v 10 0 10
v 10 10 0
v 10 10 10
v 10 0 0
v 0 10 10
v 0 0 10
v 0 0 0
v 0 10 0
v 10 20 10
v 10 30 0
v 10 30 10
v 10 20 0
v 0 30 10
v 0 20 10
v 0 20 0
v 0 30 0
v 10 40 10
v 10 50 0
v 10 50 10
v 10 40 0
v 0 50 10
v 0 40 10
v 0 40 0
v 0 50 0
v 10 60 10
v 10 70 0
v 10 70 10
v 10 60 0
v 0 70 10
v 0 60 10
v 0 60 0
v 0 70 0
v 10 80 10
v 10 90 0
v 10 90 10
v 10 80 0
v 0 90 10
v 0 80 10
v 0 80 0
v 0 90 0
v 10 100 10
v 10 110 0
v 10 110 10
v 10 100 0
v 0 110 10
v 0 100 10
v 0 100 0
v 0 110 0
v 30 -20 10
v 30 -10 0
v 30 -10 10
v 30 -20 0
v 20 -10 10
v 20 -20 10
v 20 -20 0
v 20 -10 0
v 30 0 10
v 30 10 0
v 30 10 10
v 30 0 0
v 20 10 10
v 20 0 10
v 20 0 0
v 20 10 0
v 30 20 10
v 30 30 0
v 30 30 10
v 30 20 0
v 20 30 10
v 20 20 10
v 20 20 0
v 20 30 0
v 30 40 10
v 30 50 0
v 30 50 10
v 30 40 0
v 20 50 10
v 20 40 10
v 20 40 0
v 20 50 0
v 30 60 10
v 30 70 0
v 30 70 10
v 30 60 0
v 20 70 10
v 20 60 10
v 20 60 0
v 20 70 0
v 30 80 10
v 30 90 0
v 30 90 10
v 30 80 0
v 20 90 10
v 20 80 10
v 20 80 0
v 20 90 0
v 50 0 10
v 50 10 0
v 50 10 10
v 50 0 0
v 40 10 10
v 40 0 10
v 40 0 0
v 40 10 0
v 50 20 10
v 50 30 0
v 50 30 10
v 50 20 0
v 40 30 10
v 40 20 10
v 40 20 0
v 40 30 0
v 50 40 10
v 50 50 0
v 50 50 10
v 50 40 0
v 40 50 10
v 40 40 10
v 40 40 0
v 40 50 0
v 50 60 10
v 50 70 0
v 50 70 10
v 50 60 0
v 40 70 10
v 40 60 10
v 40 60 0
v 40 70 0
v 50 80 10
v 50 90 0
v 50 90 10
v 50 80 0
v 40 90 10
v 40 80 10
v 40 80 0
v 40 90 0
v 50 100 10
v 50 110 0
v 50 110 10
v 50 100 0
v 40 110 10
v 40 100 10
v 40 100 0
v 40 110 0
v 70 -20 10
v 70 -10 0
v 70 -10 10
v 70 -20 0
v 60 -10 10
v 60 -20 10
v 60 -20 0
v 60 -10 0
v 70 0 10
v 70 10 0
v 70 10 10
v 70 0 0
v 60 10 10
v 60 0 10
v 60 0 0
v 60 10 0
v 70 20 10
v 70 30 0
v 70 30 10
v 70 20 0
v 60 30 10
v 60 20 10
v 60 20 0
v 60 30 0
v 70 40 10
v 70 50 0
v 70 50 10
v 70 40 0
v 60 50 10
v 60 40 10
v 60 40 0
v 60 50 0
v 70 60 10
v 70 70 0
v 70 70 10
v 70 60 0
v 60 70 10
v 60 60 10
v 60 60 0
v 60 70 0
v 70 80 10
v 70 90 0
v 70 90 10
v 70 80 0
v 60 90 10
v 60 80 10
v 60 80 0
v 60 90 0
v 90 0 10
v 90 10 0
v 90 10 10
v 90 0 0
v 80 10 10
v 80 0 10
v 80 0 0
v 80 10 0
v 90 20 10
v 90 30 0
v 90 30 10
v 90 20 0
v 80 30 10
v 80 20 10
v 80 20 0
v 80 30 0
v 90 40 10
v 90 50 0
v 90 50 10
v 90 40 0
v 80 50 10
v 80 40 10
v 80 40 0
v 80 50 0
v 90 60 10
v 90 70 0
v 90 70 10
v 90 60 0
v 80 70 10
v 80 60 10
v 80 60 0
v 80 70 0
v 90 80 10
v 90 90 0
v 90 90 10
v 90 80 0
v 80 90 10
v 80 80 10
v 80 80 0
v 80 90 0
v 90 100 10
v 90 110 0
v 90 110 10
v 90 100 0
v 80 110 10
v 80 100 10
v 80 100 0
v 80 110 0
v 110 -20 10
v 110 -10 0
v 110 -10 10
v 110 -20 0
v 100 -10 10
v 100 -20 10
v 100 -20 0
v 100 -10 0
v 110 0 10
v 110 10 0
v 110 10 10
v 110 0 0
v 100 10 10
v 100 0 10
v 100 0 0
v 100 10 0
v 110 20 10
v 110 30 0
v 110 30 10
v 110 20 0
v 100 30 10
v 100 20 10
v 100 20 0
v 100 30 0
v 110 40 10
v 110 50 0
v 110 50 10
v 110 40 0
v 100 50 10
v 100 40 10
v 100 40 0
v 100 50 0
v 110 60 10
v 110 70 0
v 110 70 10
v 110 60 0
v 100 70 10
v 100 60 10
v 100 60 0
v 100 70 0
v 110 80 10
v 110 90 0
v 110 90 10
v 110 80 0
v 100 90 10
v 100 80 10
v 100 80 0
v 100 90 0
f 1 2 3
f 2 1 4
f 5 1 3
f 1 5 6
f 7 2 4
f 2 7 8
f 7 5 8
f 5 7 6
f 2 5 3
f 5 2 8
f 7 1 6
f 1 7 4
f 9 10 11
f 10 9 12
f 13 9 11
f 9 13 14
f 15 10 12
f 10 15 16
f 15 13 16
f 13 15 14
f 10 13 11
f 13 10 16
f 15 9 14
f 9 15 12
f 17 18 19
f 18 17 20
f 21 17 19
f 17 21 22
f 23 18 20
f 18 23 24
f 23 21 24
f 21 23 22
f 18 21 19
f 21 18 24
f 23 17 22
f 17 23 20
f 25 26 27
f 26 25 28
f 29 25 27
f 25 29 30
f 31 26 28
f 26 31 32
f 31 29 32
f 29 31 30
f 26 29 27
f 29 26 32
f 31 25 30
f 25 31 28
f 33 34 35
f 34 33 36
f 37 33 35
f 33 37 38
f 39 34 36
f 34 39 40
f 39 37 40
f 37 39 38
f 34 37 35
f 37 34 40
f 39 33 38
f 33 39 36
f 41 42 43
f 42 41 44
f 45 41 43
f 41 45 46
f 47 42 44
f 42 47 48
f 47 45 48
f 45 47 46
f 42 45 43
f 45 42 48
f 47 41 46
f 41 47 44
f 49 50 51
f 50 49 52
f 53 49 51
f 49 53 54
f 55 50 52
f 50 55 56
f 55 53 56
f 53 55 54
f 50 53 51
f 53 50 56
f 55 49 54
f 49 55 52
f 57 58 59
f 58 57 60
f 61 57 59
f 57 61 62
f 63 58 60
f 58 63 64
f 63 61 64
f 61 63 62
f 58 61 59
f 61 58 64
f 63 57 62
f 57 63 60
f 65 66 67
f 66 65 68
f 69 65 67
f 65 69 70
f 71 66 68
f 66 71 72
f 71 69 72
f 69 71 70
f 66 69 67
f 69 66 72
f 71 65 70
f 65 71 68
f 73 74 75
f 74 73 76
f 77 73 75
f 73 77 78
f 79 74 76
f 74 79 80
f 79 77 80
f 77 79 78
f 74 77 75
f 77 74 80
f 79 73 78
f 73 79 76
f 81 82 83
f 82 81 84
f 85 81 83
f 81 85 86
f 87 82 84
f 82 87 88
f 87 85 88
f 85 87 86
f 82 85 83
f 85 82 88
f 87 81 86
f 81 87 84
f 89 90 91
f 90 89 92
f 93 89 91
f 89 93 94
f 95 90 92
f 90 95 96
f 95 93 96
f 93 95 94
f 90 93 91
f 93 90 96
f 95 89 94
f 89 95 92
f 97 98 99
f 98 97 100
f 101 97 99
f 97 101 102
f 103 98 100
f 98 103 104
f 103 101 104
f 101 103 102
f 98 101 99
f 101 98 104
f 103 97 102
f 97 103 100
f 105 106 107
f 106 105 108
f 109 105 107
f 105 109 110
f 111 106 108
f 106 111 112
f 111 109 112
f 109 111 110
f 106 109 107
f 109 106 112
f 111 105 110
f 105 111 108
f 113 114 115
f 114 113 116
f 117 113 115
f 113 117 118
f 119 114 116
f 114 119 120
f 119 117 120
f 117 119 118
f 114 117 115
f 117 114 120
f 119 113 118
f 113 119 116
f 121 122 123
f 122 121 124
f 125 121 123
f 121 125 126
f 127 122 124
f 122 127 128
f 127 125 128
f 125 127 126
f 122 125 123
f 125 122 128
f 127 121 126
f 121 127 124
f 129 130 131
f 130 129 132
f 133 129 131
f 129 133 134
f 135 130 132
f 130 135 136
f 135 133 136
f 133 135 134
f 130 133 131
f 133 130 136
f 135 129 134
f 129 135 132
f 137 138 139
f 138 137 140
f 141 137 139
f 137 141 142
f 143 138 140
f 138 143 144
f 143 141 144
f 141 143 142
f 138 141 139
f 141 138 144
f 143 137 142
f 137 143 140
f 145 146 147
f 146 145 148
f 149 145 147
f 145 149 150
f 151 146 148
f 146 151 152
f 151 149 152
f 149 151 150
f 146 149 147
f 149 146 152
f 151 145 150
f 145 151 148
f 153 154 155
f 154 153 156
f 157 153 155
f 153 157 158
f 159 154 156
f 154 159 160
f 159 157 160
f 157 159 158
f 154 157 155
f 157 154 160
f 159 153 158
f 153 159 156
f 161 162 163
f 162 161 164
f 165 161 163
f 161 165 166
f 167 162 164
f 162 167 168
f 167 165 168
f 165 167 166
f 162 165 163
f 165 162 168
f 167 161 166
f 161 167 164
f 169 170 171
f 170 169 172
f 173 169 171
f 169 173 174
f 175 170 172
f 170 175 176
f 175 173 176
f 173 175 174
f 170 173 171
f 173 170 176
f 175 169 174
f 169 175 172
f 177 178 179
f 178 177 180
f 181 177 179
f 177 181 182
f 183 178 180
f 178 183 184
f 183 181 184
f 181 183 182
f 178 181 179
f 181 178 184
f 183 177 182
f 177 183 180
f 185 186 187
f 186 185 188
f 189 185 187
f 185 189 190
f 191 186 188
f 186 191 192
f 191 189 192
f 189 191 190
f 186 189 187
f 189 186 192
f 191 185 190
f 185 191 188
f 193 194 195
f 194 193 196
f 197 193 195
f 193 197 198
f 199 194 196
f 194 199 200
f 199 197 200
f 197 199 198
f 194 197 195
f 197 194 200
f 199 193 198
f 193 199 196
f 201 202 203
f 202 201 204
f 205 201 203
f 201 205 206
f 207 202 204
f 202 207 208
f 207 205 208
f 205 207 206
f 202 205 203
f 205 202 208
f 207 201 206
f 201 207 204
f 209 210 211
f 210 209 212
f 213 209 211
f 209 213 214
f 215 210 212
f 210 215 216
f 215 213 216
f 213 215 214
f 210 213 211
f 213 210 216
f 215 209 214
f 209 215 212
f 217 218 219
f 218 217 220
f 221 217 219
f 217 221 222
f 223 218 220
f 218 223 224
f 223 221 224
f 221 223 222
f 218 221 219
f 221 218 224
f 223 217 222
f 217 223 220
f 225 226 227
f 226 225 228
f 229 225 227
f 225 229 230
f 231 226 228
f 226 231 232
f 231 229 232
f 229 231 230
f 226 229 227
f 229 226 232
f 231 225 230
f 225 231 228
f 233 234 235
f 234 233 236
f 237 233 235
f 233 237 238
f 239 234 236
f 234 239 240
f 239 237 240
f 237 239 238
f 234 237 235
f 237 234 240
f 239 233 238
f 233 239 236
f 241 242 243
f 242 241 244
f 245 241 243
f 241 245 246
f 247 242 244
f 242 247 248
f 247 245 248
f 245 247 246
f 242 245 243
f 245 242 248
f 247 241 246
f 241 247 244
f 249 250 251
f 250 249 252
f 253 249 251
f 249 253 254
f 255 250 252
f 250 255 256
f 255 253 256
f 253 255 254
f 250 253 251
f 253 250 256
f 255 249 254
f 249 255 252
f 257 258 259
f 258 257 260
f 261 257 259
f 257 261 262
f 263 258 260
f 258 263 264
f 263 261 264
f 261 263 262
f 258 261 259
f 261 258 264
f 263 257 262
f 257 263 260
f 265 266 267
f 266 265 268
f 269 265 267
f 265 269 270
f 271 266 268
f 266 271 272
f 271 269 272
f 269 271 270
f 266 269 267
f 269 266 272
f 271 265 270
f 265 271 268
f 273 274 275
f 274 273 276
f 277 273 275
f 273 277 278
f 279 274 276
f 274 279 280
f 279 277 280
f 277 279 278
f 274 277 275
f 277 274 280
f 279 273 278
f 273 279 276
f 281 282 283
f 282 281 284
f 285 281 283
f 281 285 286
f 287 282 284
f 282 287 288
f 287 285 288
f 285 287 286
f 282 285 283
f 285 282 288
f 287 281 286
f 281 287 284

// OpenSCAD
for(x = [0:20:100]) {
    for(y = [0:20:100]) {
        translate([x,y - (x % 40),0]) {
            cube([10,10,10]);
        }
    }
}
